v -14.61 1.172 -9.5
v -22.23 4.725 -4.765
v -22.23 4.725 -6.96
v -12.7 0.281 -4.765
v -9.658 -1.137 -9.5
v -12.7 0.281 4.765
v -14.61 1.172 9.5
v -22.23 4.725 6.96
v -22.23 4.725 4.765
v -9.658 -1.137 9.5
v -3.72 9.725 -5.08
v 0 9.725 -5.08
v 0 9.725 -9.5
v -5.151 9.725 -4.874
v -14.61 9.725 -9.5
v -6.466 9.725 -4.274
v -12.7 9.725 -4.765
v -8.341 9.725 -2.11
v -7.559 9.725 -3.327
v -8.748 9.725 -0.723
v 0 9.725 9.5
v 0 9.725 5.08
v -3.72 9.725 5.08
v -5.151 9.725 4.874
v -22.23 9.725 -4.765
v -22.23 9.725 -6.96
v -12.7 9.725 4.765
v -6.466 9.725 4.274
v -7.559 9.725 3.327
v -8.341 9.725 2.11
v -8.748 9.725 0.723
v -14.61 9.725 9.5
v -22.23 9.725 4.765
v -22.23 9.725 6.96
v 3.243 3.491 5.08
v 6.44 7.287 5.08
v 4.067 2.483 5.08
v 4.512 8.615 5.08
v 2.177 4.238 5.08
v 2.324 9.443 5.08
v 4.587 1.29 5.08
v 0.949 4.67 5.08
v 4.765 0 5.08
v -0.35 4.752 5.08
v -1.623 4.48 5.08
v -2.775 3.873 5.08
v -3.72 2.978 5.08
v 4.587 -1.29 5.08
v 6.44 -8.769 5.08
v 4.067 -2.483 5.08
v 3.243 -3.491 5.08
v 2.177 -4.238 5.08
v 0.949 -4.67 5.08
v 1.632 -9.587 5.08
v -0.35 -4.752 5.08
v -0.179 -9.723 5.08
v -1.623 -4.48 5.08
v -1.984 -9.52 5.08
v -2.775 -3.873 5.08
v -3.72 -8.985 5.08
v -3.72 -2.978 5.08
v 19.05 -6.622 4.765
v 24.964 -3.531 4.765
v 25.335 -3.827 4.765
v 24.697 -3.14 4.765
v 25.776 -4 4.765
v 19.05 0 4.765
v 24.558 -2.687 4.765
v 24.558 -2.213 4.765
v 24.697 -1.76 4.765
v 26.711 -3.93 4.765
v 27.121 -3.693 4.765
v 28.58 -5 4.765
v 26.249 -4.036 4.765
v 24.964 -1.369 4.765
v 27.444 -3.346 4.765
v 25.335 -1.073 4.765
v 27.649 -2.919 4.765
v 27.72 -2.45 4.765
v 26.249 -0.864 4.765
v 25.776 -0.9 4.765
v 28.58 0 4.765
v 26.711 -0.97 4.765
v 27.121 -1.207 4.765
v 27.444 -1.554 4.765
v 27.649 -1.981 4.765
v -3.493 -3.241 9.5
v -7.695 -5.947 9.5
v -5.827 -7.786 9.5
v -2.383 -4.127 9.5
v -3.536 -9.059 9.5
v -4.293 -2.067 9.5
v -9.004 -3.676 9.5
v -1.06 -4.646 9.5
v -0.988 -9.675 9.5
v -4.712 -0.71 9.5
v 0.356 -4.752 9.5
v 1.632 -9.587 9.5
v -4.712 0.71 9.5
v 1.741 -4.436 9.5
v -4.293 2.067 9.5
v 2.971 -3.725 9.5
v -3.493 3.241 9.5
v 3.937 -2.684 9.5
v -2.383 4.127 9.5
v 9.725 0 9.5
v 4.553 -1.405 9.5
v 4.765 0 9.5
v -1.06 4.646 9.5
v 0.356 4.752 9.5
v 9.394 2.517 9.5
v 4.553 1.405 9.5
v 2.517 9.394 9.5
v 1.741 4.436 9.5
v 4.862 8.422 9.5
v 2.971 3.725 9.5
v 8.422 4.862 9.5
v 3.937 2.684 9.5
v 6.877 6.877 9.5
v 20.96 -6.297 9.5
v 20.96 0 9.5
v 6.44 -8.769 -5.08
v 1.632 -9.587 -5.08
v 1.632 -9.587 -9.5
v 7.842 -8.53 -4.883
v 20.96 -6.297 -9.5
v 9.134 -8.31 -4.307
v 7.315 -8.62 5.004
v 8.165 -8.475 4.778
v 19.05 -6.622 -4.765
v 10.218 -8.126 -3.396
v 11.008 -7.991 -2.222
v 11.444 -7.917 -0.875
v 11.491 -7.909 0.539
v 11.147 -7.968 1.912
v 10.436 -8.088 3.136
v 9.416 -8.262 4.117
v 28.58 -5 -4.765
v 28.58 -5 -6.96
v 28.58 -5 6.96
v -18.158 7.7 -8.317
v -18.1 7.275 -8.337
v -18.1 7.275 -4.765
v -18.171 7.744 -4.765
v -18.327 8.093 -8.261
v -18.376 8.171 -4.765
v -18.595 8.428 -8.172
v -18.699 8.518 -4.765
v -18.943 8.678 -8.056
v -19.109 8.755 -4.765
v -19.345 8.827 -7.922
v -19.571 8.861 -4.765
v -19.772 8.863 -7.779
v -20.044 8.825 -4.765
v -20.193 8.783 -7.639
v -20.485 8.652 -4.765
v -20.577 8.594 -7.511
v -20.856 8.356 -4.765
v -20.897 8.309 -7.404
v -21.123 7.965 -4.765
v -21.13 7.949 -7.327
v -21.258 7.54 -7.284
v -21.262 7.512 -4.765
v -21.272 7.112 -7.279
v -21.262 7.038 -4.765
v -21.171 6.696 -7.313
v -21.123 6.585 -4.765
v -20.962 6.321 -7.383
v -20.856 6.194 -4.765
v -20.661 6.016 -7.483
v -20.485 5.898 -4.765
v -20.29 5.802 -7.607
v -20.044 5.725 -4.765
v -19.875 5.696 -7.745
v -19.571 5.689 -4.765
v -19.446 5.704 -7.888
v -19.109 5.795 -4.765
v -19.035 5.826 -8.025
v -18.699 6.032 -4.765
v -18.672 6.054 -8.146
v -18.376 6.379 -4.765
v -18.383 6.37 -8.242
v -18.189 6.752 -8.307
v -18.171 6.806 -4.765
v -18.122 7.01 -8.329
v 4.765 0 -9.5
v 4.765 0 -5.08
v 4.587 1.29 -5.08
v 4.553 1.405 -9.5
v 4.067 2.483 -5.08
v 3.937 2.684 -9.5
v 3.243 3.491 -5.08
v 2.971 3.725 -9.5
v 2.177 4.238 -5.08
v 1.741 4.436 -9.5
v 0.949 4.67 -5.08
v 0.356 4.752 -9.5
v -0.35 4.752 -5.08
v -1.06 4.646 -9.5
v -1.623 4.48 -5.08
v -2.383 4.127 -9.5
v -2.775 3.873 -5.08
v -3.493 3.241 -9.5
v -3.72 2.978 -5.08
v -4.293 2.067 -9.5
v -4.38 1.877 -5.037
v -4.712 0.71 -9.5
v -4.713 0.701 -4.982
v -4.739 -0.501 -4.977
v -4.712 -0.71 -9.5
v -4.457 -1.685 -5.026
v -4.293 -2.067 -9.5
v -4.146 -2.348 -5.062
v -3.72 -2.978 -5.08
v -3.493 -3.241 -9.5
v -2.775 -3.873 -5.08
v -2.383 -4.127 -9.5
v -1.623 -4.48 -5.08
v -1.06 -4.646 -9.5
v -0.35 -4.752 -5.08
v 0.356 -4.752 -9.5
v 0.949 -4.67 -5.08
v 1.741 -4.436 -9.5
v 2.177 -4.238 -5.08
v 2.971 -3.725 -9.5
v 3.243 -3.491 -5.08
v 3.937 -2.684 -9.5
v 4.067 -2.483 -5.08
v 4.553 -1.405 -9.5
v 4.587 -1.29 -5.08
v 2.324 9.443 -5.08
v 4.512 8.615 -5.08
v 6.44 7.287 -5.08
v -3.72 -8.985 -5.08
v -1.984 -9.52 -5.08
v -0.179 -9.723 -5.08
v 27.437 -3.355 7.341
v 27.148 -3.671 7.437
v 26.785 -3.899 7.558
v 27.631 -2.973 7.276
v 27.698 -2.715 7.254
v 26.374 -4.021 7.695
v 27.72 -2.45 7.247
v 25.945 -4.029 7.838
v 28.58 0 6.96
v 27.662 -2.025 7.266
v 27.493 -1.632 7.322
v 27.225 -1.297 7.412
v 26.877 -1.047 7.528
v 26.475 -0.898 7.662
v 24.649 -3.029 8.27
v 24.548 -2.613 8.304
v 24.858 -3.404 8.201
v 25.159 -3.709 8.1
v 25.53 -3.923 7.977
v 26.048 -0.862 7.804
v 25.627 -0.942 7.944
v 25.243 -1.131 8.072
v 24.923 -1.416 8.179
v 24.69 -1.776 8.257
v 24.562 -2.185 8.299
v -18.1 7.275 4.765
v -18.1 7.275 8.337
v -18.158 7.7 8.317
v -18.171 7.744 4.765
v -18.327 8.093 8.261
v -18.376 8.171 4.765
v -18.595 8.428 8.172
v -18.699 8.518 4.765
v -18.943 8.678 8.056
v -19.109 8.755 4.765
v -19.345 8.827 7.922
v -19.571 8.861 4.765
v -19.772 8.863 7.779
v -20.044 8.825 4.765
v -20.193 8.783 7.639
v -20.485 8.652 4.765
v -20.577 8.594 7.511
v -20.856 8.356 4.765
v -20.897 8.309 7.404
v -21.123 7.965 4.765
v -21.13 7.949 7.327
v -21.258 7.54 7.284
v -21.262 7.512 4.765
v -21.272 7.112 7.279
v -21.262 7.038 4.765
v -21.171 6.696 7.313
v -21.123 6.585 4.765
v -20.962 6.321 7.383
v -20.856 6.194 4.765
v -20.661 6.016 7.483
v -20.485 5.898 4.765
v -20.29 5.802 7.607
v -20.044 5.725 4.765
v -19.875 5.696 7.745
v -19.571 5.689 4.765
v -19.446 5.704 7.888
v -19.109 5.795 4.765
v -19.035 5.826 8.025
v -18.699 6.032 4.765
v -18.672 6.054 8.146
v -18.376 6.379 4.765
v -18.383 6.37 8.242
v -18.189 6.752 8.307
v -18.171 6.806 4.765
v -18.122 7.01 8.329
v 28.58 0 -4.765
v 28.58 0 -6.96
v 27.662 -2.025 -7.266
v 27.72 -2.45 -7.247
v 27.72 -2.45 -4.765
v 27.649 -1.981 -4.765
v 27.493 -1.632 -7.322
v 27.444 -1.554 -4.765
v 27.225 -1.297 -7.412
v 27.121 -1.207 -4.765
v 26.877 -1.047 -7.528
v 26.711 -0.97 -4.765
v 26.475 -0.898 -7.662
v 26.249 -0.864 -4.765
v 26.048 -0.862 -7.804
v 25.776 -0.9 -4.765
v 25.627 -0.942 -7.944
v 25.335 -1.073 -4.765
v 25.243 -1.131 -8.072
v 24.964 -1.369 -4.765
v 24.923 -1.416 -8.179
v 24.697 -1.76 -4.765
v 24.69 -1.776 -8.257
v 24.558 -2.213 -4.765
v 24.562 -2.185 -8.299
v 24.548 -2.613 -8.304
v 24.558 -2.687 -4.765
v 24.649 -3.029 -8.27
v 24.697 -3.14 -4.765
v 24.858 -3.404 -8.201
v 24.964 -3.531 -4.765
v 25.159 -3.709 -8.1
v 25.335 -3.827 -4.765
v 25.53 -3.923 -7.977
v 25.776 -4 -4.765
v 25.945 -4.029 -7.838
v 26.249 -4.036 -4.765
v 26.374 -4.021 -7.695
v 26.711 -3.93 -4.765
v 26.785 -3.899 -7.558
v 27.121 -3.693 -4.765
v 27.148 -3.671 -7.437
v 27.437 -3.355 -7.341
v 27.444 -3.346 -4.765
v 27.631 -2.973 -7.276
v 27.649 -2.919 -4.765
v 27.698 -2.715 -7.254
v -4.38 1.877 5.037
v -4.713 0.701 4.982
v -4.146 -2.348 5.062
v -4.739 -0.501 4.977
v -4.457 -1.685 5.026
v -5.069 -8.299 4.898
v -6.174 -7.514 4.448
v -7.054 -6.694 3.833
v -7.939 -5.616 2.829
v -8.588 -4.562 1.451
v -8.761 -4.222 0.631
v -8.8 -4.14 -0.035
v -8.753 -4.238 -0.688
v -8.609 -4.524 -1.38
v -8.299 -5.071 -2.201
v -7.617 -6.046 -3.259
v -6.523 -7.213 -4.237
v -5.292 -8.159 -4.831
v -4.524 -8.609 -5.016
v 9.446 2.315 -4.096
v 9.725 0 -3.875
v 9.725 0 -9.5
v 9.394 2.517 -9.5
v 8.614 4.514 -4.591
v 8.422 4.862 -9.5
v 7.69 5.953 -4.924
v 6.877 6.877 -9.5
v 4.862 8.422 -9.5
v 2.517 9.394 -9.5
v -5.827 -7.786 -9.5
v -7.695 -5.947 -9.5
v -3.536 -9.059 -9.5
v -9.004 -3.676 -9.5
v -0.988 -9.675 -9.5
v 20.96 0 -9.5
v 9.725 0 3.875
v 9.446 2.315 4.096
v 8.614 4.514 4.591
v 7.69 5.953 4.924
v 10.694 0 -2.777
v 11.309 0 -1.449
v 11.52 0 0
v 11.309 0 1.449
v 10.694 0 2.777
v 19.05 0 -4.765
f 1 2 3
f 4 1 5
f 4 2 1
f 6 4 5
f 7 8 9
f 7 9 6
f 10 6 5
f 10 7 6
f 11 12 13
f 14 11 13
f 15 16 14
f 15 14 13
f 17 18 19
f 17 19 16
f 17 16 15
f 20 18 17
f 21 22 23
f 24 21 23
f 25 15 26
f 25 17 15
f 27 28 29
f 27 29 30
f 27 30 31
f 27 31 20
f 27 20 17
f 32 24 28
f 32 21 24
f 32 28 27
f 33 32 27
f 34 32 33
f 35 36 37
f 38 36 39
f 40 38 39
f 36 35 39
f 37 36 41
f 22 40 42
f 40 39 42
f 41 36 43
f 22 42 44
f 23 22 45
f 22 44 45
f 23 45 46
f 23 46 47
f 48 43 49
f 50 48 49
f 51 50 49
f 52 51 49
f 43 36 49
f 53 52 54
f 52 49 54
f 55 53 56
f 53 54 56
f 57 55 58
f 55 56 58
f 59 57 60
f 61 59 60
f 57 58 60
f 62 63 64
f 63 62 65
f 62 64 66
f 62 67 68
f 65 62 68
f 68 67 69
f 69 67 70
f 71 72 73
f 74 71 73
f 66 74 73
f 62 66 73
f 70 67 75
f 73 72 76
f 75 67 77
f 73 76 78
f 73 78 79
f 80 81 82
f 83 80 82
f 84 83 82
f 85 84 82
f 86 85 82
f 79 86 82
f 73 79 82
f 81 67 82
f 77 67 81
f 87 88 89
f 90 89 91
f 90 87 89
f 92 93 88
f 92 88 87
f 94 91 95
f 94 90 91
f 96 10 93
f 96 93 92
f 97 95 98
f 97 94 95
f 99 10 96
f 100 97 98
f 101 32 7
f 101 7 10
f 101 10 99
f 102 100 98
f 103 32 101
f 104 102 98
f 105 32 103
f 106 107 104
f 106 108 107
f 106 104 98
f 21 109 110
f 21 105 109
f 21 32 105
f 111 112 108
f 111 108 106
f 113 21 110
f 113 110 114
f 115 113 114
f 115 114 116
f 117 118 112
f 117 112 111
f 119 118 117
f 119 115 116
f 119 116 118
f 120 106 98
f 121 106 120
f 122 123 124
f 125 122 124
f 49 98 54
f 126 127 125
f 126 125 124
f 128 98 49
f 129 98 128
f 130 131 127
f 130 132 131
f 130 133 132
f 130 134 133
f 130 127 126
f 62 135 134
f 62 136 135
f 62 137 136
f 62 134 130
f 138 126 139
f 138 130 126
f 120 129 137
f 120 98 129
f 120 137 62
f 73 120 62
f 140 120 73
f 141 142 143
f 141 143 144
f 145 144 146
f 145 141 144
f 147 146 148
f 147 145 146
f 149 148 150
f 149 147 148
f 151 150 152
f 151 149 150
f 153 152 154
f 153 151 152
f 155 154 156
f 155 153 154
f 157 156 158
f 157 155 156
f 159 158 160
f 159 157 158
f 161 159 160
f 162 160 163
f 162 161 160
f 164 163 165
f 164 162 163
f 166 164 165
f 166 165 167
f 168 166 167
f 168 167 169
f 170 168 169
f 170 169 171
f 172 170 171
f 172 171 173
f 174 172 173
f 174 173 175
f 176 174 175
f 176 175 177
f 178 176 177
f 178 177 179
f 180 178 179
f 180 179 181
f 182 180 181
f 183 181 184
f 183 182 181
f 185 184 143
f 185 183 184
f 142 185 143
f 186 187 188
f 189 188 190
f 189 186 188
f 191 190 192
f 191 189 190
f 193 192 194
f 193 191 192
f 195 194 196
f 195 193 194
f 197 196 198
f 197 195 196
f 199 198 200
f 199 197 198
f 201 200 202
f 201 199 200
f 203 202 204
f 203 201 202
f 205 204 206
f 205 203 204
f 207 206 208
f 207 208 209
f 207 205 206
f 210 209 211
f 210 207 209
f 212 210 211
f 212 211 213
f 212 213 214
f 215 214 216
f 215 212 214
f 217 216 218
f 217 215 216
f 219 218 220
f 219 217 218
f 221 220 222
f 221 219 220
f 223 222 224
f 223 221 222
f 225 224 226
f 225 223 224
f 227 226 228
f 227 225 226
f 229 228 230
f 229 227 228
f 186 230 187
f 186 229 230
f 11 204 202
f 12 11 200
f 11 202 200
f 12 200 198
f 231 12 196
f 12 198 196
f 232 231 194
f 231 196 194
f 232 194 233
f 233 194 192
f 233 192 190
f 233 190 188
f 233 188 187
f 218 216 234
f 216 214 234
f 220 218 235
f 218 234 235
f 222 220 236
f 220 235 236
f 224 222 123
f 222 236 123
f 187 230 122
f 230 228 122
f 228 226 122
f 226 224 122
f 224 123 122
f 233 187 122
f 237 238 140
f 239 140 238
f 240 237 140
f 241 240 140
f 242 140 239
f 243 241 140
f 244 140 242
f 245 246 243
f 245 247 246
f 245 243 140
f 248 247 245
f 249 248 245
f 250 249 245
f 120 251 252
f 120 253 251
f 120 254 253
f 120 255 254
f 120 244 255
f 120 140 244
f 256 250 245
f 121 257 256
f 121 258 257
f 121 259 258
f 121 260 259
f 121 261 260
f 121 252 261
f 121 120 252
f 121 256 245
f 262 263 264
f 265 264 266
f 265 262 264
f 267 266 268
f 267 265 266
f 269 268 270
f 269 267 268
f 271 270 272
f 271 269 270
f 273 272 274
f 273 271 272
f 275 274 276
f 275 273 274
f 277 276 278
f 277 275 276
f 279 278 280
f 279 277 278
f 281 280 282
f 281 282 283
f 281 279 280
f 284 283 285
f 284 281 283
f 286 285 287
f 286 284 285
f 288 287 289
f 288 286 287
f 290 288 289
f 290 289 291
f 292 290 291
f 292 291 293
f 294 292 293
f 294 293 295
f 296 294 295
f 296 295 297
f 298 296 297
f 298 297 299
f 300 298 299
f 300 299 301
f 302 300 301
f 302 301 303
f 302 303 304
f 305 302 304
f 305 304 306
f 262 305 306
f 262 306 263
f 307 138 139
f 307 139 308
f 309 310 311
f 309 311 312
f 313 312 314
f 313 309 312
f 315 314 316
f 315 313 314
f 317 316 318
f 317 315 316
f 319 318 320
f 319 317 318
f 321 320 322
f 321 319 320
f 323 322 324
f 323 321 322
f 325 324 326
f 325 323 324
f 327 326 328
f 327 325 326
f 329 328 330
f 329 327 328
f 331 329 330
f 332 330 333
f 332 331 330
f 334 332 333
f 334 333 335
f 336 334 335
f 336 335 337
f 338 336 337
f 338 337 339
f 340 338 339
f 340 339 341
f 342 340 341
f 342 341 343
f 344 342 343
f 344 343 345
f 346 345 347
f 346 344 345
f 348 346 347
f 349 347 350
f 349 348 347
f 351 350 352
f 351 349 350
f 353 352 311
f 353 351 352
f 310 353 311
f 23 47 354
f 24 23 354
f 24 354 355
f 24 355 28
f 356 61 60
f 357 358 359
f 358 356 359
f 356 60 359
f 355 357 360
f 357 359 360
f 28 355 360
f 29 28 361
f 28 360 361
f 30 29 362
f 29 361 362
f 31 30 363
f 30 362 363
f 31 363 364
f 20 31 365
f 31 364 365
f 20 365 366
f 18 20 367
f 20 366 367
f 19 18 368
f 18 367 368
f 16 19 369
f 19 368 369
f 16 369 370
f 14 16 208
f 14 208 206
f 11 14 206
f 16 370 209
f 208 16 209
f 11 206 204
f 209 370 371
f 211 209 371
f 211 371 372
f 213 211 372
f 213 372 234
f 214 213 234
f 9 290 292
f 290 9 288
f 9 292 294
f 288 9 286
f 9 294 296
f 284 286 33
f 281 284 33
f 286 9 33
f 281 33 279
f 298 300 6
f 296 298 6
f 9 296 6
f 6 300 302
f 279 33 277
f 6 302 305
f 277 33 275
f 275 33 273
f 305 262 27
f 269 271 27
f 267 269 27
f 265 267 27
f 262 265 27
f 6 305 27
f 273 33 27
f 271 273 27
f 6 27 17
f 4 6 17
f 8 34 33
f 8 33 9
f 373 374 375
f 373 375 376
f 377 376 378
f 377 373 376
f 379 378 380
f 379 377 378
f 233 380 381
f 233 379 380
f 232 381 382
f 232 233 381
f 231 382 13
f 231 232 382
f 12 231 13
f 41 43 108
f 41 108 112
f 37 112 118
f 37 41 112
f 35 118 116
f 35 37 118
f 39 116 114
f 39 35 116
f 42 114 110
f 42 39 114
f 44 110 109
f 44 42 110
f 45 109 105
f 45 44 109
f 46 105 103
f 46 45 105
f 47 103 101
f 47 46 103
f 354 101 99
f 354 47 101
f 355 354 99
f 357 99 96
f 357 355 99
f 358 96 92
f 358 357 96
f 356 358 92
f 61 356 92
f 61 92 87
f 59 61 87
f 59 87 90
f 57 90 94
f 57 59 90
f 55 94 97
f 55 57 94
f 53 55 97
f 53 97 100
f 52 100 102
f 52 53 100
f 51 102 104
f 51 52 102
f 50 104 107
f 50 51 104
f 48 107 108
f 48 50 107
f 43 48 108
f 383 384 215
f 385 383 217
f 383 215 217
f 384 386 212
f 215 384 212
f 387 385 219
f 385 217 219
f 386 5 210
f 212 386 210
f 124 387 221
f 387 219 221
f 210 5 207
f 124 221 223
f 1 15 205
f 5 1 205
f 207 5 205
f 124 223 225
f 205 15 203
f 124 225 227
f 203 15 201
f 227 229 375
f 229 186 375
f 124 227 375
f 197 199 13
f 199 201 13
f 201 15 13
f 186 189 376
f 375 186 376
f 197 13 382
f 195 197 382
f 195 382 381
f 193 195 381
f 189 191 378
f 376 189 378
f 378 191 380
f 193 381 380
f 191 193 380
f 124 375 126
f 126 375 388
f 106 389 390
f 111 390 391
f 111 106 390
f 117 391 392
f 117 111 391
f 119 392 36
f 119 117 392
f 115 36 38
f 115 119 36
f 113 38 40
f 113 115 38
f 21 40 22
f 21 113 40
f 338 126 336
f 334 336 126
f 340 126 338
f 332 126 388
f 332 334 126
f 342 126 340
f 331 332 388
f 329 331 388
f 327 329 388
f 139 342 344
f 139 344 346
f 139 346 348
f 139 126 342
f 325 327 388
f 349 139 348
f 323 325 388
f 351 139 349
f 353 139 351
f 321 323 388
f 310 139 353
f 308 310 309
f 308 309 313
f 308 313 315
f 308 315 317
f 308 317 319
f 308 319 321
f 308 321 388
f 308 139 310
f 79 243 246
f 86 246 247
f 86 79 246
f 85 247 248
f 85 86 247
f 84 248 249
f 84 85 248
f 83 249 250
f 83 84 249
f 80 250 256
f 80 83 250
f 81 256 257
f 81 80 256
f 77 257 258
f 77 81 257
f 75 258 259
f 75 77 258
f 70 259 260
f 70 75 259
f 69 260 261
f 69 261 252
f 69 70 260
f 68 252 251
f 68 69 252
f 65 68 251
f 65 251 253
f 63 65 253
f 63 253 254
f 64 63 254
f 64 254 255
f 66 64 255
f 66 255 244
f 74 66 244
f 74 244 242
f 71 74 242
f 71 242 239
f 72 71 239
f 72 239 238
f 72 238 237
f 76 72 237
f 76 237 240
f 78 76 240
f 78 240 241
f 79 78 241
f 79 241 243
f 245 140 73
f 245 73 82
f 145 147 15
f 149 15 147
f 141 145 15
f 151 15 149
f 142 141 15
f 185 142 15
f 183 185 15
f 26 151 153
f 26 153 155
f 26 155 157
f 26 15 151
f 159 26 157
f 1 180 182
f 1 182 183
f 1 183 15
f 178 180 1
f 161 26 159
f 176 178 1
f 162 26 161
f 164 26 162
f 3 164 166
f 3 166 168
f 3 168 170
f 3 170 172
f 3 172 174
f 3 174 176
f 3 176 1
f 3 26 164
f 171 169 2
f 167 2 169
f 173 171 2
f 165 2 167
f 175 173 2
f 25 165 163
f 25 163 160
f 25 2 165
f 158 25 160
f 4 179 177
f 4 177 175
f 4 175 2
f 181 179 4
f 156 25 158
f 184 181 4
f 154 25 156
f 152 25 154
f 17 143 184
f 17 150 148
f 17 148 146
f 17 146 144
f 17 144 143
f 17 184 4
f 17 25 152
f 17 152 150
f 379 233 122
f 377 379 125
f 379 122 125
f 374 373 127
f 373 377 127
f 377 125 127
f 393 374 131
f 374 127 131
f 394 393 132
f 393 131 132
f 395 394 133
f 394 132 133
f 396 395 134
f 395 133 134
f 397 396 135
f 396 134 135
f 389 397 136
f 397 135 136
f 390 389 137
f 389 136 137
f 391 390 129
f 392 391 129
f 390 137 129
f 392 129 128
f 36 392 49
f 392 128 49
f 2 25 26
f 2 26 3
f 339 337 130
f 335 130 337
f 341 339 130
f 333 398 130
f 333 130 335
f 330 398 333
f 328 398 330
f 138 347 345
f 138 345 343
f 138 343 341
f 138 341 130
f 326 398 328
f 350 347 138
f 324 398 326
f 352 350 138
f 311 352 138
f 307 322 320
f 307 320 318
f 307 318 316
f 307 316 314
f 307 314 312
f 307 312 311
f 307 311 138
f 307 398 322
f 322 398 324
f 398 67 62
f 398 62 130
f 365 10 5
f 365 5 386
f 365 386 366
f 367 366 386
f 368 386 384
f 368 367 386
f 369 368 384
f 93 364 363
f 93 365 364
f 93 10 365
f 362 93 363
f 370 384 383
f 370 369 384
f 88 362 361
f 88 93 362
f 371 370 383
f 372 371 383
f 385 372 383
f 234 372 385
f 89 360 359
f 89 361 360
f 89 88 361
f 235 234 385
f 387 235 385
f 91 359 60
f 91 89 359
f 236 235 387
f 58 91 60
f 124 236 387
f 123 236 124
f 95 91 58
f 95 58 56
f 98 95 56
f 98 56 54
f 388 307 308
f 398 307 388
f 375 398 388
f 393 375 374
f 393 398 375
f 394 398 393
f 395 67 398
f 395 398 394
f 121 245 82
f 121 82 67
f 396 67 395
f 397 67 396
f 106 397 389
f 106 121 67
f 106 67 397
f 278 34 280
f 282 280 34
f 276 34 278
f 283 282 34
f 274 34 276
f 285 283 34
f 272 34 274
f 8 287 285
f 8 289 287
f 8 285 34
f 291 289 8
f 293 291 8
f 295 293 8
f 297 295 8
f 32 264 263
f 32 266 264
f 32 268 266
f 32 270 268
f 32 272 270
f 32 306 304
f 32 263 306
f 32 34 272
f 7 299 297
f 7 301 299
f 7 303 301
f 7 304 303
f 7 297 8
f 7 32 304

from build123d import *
from OCP.BRepFilletAPI import BRepFilletAPI_MakeChamfer

# Parameters (mm, degrees)
SKETCH2_R               = 4.765
BOSS_EXTRUDE1_DEPTH     = 9.5
CHAMFER1_SIZE           = 7.62
CHAMFER1_SIZE2          = 2.54
CHAMFER2_SIZE           = 2.54
CHAMFER2_SIZE2          = 7.62
SKETCH3_W               = 9.53
SKETCH3_H               = 9.53
CUT_EXTRUDE1_DEPTH      = 36.852041783
CUT_EXTRUDE2_DEPTH      = 32.648728647
CUT_EXTRUDE2_DEPTH_BACK = 32.648728647
CUT_EXTRUDE3_DEPTH      = 32.648728708
CUT_EXTRUDE3_DEPTH_BACK = 32.648728708
SKETCH5_R               = 1.59


with BuildPart() as part:
    # Sketch2 → Boss-Extrude1 (new, symmetric)
    with BuildSketch(Plane.XY):
        with BuildLine():
            Line((0, 9.725), (-22.23, 9.725))
            Line((-22.23, 9.725), (-22.23, 4.725))
            Line((-22.23, 4.725), (-9.658270439, -1.13729377))
            ThreePointArc((-9.658270439, -1.13729377), (-5.827126273, -7.785899075), (1.631914869, -9.587099606))
            Line((1.631914869, -9.587099606), (28.58, -5))
            Line((28.58, -5), (28.58, 0))
            Line((28.58, 0), (9.725, 0))
            ThreePointArc((9.725, 0), (6.876613447, 6.876613447), (0, 9.725))
        make_face()
        Circle(SKETCH2_R, mode=Mode.SUBTRACT)
    extrude(amount=BOSS_EXTRUDE1_DEPTH, both=True)

    # Chamfer1
    chamfer1_edges = [part.edges().sort_by_distance(p)[0] for p in [
        (-22.23, 7.225, -9.5),
        (28.58, -2.5, -9.5),
    ]]
    chamfer1_side = [part.faces().sort_by_distance(p)[0] for p in [
        (-11.115, 9.180944984, -9.5),
    ]]
    chamfer(chamfer1_edges, length=CHAMFER1_SIZE, length2=CHAMFER1_SIZE2, reference=chamfer1_side[0])

    # Chamfer2: one chamfer whose edges measure the first distance from different faces: ONE call of the kernel's chamfer builder (chamfer() names one face for all edges)
    chamfer2_edges_1 = [part.edges().sort_by_distance(p)[0] for p in [
        (-22.23, 7.225, 9.5),
    ]]
    chamfer2_side_1 = [part.faces().sort_by_distance(p)[0] for p in [
        (-22.23, 7.225, 1.27),
    ]]
    chamfer2_edges_2 = [part.edges().sort_by_distance(p)[0] for p in [
        (28.58, -2.5, 9.5),
    ]]
    chamfer2_side_2 = [part.faces().sort_by_distance(p)[0] for p in [
        (28.58, -2.5, 1.27),
    ]]
    chamfer2 = BRepFilletAPI_MakeChamfer(part.part.solid().wrapped)
    for e in chamfer2_edges_1:
        chamfer2.Add(CHAMFER2_SIZE, CHAMFER2_SIZE2, e.wrapped, chamfer2_side_1[0].wrapped)  # the first distance lies on this face
    for e in chamfer2_edges_2:
        chamfer2.Add(CHAMFER2_SIZE, CHAMFER2_SIZE2, e.wrapped, chamfer2_side_2[0].wrapped)  # the first distance lies on this face
    add(Compound.cast(chamfer2.Shape()), mode=Mode.REPLACE)

    # Sketch3 → Cut-Extrude1 (cut, through all)
    with BuildSketch(Plane(origin=(0, 9.725, 0), x_dir=(1, 0, 0), z_dir=(0, 1, 0))):
        with Locations((-17.465, 0)):
            Rectangle(SKETCH3_W, SKETCH3_H)
        with Locations((23.815, 0)):
            Rectangle(SKETCH3_W, SKETCH3_H)
    extrude(amount=-CUT_EXTRUDE1_DEPTH, mode=Mode.SUBTRACT)

    # Sketch4 → Cut-Extrude2 (cut, two sides: drawn at the far end of the back side and taken through both)
    with BuildSketch(Plane(origin=(0, 0, 0), x_dir=(1, 0, 0), z_dir=(0, 1, 0)).offset(-CUT_EXTRUDE2_DEPTH_BACK)):
        with BuildLine():
            Line((-3.72, 5.08), (6.44, 5.08))
            ThreePointArc((6.44, 5.08), (11.52, 0), (6.44, -5.08))
            Line((6.44, -5.08), (-3.72, -5.08))
            ThreePointArc((-3.72, -5.08), (-8.8, 0), (-3.72, 5.08))
        make_face()
    extrude(amount=CUT_EXTRUDE2_DEPTH + CUT_EXTRUDE2_DEPTH_BACK, mode=Mode.SUBTRACT)

    # Sketch5 → Cut-Extrude3 (cut, two sides: drawn at the far end of the back side and taken through both)
    with BuildSketch(Plane.XY.offset(-CUT_EXTRUDE3_DEPTH_BACK)):
        with Locations((-19.69, 7.275)):
            Circle(SKETCH5_R)
        with Locations((26.13, -2.45)):
            Circle(SKETCH5_R)
    extrude(amount=CUT_EXTRUDE3_DEPTH + CUT_EXTRUDE3_DEPTH_BACK, mode=Mode.SUBTRACT)


solid = part.part
